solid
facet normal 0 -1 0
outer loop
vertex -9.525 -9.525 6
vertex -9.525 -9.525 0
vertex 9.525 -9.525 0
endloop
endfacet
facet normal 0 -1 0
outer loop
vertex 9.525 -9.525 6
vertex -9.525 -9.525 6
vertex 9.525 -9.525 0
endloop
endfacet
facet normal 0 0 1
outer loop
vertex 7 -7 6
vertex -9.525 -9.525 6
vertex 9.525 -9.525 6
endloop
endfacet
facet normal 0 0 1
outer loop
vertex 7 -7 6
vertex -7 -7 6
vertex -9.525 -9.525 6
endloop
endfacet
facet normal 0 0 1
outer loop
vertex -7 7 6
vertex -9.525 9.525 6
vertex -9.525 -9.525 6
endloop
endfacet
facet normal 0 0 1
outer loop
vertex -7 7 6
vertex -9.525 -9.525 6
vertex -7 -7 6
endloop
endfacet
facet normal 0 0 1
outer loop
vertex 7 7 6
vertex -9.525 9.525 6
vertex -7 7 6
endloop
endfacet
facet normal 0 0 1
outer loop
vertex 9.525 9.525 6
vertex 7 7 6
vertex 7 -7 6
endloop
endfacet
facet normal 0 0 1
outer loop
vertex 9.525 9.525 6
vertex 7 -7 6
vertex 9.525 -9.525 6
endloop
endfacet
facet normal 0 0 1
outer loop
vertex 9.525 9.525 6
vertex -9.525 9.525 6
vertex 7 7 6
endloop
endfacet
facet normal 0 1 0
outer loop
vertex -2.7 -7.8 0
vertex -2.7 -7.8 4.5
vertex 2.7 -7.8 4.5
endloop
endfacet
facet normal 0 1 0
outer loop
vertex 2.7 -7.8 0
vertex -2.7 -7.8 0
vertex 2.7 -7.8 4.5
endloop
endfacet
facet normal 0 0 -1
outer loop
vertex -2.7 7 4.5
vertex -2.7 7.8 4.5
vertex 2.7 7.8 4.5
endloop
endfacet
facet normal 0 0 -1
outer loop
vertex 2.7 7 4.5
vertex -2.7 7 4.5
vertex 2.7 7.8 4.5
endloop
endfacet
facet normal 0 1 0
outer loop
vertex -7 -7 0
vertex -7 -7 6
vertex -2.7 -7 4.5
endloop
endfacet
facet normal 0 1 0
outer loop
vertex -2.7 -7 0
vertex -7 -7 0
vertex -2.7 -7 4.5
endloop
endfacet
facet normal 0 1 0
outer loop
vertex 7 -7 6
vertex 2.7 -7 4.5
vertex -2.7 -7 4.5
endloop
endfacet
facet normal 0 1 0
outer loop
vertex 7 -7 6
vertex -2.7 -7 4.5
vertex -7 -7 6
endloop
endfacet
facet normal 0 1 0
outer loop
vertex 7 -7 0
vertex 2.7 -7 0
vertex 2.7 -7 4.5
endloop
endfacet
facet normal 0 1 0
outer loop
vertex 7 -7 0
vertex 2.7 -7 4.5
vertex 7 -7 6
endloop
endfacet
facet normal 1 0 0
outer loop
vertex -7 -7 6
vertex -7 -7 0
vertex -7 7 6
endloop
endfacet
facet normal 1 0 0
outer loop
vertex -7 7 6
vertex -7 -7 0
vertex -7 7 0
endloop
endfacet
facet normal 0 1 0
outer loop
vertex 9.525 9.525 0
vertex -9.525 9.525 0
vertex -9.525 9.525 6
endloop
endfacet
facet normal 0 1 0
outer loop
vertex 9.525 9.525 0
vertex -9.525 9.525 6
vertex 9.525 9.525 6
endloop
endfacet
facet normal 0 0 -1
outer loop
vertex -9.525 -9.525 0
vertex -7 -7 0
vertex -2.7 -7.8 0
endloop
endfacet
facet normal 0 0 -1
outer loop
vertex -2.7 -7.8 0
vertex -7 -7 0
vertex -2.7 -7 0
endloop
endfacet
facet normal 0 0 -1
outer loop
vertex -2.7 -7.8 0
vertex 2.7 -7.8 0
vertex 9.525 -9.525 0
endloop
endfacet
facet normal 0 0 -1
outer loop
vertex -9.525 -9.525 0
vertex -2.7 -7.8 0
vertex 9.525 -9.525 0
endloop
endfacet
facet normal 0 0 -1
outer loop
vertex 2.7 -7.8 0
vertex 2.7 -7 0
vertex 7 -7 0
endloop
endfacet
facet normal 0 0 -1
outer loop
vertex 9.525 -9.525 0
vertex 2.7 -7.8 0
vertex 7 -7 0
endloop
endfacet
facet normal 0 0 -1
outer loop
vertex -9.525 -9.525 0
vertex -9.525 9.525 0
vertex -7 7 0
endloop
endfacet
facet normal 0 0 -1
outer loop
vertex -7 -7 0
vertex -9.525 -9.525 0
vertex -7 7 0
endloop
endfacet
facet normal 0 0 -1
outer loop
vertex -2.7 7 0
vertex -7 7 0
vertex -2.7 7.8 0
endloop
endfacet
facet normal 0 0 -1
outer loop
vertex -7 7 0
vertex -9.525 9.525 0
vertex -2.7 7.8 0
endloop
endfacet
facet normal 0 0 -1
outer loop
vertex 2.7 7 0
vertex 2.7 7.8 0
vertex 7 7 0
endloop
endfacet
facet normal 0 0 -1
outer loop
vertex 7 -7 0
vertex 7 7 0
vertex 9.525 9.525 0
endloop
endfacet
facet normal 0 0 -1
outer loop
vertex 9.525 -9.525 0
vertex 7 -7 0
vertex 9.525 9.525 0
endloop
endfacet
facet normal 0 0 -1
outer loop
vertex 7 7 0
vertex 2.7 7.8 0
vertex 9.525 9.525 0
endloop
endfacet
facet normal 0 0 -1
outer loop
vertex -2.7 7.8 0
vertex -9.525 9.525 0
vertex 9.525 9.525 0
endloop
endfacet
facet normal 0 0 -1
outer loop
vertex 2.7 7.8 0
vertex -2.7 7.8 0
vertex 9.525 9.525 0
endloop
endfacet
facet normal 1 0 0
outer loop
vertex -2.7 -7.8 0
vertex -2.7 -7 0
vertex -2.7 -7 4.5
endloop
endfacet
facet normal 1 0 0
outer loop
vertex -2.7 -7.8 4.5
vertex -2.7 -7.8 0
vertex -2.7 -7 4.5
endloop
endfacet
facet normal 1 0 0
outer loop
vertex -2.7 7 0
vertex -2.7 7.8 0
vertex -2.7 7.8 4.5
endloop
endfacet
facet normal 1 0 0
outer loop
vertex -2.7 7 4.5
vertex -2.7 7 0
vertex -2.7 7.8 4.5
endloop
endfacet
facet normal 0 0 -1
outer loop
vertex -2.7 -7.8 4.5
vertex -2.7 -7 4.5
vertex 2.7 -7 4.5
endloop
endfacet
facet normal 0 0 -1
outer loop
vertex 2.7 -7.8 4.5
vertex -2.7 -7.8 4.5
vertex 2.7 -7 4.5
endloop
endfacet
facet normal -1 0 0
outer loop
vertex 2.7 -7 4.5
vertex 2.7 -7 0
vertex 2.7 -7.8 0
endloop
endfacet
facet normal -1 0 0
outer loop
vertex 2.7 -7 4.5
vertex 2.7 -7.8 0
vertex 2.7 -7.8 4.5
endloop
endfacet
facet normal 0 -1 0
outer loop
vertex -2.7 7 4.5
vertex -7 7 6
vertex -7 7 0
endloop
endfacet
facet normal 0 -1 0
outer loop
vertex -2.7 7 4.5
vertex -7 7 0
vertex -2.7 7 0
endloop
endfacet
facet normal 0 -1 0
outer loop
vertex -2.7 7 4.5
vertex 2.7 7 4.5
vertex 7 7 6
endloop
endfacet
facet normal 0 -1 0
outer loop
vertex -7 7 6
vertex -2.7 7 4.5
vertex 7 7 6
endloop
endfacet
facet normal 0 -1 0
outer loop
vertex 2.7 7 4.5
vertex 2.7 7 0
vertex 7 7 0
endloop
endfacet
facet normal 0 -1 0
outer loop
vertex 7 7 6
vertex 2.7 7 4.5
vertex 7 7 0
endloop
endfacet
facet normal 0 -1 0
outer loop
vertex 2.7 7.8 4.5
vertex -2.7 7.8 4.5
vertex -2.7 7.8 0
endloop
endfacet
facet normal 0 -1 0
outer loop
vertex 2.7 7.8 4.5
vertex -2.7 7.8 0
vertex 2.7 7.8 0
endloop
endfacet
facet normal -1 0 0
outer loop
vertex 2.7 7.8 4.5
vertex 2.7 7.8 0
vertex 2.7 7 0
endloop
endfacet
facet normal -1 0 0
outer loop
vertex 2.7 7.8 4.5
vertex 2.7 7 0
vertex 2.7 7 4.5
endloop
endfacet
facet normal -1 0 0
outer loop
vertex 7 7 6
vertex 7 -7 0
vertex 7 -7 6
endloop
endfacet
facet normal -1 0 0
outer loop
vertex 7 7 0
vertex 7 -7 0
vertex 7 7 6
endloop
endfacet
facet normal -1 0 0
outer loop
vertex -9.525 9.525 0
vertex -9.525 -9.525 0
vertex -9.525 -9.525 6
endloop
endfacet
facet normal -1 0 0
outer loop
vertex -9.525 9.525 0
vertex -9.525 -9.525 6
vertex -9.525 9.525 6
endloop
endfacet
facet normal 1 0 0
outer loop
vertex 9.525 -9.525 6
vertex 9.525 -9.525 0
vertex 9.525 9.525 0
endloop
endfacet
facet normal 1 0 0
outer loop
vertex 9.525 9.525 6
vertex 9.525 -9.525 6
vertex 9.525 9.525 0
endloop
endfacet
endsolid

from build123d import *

# Parameters (mm, degrees)
SKETCH1_W           = 19.05
SKETCH1_H           = 19.05
SKETCH1_W_2         = 14
SKETCH1_H_2         = 14
BOSS_EXTRUDE1_DEPTH = 6
CUT_EXTRUDE1_START  = -0.8
SKETCH2_W           = 5.4
SKETCH2_H           = 4.5
CUT_EXTRUDE1_DEPTH  = 15.6


with BuildPart() as part:
    # Sketch1 → Boss-Extrude1 (new body)
    with BuildSketch(Plane.XY):
        Rectangle(SKETCH1_W, SKETCH1_H)
        Rectangle(SKETCH1_W_2, SKETCH1_H_2, mode=Mode.SUBTRACT)
    extrude(amount=BOSS_EXTRUDE1_DEPTH)

    # Sketch2 → Cut-Extrude1 (cut)
    with BuildSketch(Plane.XZ.offset(-7).offset(CUT_EXTRUDE1_START)):
        with Locations((0, 2.25)):
            Rectangle(SKETCH2_W, SKETCH2_H)
    extrude(amount=CUT_EXTRUDE1_DEPTH, mode=Mode.SUBTRACT)


solid = part.part
